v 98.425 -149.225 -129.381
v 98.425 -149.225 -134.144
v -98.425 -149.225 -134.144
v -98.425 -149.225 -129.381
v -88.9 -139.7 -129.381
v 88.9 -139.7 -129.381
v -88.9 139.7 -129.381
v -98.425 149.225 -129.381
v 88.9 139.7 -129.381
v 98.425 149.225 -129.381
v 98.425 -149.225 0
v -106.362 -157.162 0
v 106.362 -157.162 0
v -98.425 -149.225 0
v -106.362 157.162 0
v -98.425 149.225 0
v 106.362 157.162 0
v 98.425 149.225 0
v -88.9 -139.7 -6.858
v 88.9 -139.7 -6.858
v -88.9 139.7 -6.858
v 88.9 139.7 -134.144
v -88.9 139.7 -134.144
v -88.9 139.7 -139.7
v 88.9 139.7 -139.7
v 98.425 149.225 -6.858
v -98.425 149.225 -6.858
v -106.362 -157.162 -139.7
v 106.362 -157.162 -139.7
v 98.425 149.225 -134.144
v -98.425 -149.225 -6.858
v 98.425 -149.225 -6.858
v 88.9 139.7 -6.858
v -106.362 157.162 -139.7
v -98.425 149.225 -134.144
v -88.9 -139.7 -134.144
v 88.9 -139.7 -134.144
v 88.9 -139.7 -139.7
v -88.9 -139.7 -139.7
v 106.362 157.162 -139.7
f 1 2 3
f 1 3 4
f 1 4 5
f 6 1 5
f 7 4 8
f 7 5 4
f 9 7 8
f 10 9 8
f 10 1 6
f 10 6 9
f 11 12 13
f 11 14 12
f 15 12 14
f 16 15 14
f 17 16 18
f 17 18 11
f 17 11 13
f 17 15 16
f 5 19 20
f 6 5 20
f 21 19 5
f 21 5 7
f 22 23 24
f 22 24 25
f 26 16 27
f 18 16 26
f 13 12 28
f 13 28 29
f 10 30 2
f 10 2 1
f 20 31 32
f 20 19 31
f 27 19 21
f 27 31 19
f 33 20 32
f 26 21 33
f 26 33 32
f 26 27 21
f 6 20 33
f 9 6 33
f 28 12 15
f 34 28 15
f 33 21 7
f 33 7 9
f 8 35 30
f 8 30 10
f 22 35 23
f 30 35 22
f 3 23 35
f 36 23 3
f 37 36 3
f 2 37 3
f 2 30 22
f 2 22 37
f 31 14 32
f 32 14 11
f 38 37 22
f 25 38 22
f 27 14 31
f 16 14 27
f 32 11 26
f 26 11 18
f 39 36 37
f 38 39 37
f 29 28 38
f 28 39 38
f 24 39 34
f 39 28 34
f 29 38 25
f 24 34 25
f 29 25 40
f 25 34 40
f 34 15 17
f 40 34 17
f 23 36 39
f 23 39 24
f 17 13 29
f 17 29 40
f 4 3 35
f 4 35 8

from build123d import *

# Parameters (mm, degrees)
SKETCH1_W           = 212.725
SKETCH1_H           = 314.325
SKETCH1_W_2         = 177.8
SKETCH1_H_2         = 279.4
BOSS_EXTRUDE1_DEPTH = 139.7
SKETCH4_W           = 9.525
SKETCH4_H           = 4.7625
SKETCH6_W           = 196.85
SKETCH6_H           = 298.45
SKETCH6_W_2         = 177.8
SKETCH6_H_2         = 279.4
CUT_EXTRUDE3_DEPTH  = 6.858


with BuildPart() as part:
    # Sketch1 → Boss-Extrude1 (new body)
    with BuildSketch(Plane.XY):
        Rectangle(SKETCH1_W, SKETCH1_H)
        Rectangle(SKETCH1_W_2, SKETCH1_H_2, mode=Mode.SUBTRACT)
    extrude(amount=-BOSS_EXTRUDE1_DEPTH)

    # Cut-Sweep2: sweep along a path in Sketch5
    with BuildLine(Plane(origin=(0, 0, -139.7), x_dir=(-1, 0, 0), z_dir=(0, 0, -1))) as cut_sweep2_path:
        Line((-88.9, -139.7), (-88.9, 139.7))
        Line((-88.9, 139.7), (88.9, 139.7))
        Line((88.9, 139.7), (88.9, -139.7))
        Line((88.9, -139.7), (-88.9, -139.7))
    # Sketch4 → Cut-Sweep2 (sweep, cut)
    with BuildSketch(Plane(origin=(0, 0, 0), x_dir=(1, 0, 0), z_dir=(0, 1, 0))):
        with Locations((-93.6625, 131.7625)):
            Rectangle(SKETCH4_W, SKETCH4_H)
    sweep(path=cut_sweep2_path.line, transition=Transition.RIGHT, mode=Mode.SUBTRACT)

    # Sketch6 → Cut-Extrude3 (cut)
    with BuildSketch(Plane.XY):
        Rectangle(SKETCH6_W, SKETCH6_H)
        Rectangle(SKETCH6_W_2, SKETCH6_H_2, mode=Mode.SUBTRACT)
    extrude(amount=-CUT_EXTRUDE3_DEPTH, mode=Mode.SUBTRACT)


solid = part.part
